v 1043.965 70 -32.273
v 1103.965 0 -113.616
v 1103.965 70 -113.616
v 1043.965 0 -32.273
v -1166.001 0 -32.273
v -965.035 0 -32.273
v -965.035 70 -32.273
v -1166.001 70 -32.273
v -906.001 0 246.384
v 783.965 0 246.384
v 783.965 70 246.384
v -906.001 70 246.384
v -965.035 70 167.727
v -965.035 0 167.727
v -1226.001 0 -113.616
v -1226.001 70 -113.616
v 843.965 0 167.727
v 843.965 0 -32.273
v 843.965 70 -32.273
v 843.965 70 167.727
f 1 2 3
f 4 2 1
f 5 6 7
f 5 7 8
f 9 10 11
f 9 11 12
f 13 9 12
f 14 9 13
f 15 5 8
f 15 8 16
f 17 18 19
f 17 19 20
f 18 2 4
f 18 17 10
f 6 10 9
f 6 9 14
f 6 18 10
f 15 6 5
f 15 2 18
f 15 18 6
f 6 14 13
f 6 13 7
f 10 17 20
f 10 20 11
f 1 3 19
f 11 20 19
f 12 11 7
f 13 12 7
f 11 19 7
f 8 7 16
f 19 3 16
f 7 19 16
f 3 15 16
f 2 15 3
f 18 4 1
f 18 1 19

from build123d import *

# Parameters (mm, degrees)
EXTRUDE_1_DEPTH = 70


with BuildPart() as part:
    # 草图1 → 凸台-拉伸1 (new body)
    with BuildSketch(Plane(origin=(0, 0, 0), x_dir=(1, 0, 0), z_dir=(0, 1, 0))):
        Polygon((-1226.000639084, 113.615915427), (1103.964935241, 113.615915427), (1043.964935241, 32.273003651), (843.964935241, 32.273003651), (843.964935241, -167.726996349), (783.964935241, -246.384084573), (-906.000639084, -246.384084573), (-965.035064759, -167.726996349), (-965.035064759, 32.273003651), (-1166.000639084, 32.273003651), align=None)
    extrude(amount=EXTRUDE_1_DEPTH)


solid = part.part
